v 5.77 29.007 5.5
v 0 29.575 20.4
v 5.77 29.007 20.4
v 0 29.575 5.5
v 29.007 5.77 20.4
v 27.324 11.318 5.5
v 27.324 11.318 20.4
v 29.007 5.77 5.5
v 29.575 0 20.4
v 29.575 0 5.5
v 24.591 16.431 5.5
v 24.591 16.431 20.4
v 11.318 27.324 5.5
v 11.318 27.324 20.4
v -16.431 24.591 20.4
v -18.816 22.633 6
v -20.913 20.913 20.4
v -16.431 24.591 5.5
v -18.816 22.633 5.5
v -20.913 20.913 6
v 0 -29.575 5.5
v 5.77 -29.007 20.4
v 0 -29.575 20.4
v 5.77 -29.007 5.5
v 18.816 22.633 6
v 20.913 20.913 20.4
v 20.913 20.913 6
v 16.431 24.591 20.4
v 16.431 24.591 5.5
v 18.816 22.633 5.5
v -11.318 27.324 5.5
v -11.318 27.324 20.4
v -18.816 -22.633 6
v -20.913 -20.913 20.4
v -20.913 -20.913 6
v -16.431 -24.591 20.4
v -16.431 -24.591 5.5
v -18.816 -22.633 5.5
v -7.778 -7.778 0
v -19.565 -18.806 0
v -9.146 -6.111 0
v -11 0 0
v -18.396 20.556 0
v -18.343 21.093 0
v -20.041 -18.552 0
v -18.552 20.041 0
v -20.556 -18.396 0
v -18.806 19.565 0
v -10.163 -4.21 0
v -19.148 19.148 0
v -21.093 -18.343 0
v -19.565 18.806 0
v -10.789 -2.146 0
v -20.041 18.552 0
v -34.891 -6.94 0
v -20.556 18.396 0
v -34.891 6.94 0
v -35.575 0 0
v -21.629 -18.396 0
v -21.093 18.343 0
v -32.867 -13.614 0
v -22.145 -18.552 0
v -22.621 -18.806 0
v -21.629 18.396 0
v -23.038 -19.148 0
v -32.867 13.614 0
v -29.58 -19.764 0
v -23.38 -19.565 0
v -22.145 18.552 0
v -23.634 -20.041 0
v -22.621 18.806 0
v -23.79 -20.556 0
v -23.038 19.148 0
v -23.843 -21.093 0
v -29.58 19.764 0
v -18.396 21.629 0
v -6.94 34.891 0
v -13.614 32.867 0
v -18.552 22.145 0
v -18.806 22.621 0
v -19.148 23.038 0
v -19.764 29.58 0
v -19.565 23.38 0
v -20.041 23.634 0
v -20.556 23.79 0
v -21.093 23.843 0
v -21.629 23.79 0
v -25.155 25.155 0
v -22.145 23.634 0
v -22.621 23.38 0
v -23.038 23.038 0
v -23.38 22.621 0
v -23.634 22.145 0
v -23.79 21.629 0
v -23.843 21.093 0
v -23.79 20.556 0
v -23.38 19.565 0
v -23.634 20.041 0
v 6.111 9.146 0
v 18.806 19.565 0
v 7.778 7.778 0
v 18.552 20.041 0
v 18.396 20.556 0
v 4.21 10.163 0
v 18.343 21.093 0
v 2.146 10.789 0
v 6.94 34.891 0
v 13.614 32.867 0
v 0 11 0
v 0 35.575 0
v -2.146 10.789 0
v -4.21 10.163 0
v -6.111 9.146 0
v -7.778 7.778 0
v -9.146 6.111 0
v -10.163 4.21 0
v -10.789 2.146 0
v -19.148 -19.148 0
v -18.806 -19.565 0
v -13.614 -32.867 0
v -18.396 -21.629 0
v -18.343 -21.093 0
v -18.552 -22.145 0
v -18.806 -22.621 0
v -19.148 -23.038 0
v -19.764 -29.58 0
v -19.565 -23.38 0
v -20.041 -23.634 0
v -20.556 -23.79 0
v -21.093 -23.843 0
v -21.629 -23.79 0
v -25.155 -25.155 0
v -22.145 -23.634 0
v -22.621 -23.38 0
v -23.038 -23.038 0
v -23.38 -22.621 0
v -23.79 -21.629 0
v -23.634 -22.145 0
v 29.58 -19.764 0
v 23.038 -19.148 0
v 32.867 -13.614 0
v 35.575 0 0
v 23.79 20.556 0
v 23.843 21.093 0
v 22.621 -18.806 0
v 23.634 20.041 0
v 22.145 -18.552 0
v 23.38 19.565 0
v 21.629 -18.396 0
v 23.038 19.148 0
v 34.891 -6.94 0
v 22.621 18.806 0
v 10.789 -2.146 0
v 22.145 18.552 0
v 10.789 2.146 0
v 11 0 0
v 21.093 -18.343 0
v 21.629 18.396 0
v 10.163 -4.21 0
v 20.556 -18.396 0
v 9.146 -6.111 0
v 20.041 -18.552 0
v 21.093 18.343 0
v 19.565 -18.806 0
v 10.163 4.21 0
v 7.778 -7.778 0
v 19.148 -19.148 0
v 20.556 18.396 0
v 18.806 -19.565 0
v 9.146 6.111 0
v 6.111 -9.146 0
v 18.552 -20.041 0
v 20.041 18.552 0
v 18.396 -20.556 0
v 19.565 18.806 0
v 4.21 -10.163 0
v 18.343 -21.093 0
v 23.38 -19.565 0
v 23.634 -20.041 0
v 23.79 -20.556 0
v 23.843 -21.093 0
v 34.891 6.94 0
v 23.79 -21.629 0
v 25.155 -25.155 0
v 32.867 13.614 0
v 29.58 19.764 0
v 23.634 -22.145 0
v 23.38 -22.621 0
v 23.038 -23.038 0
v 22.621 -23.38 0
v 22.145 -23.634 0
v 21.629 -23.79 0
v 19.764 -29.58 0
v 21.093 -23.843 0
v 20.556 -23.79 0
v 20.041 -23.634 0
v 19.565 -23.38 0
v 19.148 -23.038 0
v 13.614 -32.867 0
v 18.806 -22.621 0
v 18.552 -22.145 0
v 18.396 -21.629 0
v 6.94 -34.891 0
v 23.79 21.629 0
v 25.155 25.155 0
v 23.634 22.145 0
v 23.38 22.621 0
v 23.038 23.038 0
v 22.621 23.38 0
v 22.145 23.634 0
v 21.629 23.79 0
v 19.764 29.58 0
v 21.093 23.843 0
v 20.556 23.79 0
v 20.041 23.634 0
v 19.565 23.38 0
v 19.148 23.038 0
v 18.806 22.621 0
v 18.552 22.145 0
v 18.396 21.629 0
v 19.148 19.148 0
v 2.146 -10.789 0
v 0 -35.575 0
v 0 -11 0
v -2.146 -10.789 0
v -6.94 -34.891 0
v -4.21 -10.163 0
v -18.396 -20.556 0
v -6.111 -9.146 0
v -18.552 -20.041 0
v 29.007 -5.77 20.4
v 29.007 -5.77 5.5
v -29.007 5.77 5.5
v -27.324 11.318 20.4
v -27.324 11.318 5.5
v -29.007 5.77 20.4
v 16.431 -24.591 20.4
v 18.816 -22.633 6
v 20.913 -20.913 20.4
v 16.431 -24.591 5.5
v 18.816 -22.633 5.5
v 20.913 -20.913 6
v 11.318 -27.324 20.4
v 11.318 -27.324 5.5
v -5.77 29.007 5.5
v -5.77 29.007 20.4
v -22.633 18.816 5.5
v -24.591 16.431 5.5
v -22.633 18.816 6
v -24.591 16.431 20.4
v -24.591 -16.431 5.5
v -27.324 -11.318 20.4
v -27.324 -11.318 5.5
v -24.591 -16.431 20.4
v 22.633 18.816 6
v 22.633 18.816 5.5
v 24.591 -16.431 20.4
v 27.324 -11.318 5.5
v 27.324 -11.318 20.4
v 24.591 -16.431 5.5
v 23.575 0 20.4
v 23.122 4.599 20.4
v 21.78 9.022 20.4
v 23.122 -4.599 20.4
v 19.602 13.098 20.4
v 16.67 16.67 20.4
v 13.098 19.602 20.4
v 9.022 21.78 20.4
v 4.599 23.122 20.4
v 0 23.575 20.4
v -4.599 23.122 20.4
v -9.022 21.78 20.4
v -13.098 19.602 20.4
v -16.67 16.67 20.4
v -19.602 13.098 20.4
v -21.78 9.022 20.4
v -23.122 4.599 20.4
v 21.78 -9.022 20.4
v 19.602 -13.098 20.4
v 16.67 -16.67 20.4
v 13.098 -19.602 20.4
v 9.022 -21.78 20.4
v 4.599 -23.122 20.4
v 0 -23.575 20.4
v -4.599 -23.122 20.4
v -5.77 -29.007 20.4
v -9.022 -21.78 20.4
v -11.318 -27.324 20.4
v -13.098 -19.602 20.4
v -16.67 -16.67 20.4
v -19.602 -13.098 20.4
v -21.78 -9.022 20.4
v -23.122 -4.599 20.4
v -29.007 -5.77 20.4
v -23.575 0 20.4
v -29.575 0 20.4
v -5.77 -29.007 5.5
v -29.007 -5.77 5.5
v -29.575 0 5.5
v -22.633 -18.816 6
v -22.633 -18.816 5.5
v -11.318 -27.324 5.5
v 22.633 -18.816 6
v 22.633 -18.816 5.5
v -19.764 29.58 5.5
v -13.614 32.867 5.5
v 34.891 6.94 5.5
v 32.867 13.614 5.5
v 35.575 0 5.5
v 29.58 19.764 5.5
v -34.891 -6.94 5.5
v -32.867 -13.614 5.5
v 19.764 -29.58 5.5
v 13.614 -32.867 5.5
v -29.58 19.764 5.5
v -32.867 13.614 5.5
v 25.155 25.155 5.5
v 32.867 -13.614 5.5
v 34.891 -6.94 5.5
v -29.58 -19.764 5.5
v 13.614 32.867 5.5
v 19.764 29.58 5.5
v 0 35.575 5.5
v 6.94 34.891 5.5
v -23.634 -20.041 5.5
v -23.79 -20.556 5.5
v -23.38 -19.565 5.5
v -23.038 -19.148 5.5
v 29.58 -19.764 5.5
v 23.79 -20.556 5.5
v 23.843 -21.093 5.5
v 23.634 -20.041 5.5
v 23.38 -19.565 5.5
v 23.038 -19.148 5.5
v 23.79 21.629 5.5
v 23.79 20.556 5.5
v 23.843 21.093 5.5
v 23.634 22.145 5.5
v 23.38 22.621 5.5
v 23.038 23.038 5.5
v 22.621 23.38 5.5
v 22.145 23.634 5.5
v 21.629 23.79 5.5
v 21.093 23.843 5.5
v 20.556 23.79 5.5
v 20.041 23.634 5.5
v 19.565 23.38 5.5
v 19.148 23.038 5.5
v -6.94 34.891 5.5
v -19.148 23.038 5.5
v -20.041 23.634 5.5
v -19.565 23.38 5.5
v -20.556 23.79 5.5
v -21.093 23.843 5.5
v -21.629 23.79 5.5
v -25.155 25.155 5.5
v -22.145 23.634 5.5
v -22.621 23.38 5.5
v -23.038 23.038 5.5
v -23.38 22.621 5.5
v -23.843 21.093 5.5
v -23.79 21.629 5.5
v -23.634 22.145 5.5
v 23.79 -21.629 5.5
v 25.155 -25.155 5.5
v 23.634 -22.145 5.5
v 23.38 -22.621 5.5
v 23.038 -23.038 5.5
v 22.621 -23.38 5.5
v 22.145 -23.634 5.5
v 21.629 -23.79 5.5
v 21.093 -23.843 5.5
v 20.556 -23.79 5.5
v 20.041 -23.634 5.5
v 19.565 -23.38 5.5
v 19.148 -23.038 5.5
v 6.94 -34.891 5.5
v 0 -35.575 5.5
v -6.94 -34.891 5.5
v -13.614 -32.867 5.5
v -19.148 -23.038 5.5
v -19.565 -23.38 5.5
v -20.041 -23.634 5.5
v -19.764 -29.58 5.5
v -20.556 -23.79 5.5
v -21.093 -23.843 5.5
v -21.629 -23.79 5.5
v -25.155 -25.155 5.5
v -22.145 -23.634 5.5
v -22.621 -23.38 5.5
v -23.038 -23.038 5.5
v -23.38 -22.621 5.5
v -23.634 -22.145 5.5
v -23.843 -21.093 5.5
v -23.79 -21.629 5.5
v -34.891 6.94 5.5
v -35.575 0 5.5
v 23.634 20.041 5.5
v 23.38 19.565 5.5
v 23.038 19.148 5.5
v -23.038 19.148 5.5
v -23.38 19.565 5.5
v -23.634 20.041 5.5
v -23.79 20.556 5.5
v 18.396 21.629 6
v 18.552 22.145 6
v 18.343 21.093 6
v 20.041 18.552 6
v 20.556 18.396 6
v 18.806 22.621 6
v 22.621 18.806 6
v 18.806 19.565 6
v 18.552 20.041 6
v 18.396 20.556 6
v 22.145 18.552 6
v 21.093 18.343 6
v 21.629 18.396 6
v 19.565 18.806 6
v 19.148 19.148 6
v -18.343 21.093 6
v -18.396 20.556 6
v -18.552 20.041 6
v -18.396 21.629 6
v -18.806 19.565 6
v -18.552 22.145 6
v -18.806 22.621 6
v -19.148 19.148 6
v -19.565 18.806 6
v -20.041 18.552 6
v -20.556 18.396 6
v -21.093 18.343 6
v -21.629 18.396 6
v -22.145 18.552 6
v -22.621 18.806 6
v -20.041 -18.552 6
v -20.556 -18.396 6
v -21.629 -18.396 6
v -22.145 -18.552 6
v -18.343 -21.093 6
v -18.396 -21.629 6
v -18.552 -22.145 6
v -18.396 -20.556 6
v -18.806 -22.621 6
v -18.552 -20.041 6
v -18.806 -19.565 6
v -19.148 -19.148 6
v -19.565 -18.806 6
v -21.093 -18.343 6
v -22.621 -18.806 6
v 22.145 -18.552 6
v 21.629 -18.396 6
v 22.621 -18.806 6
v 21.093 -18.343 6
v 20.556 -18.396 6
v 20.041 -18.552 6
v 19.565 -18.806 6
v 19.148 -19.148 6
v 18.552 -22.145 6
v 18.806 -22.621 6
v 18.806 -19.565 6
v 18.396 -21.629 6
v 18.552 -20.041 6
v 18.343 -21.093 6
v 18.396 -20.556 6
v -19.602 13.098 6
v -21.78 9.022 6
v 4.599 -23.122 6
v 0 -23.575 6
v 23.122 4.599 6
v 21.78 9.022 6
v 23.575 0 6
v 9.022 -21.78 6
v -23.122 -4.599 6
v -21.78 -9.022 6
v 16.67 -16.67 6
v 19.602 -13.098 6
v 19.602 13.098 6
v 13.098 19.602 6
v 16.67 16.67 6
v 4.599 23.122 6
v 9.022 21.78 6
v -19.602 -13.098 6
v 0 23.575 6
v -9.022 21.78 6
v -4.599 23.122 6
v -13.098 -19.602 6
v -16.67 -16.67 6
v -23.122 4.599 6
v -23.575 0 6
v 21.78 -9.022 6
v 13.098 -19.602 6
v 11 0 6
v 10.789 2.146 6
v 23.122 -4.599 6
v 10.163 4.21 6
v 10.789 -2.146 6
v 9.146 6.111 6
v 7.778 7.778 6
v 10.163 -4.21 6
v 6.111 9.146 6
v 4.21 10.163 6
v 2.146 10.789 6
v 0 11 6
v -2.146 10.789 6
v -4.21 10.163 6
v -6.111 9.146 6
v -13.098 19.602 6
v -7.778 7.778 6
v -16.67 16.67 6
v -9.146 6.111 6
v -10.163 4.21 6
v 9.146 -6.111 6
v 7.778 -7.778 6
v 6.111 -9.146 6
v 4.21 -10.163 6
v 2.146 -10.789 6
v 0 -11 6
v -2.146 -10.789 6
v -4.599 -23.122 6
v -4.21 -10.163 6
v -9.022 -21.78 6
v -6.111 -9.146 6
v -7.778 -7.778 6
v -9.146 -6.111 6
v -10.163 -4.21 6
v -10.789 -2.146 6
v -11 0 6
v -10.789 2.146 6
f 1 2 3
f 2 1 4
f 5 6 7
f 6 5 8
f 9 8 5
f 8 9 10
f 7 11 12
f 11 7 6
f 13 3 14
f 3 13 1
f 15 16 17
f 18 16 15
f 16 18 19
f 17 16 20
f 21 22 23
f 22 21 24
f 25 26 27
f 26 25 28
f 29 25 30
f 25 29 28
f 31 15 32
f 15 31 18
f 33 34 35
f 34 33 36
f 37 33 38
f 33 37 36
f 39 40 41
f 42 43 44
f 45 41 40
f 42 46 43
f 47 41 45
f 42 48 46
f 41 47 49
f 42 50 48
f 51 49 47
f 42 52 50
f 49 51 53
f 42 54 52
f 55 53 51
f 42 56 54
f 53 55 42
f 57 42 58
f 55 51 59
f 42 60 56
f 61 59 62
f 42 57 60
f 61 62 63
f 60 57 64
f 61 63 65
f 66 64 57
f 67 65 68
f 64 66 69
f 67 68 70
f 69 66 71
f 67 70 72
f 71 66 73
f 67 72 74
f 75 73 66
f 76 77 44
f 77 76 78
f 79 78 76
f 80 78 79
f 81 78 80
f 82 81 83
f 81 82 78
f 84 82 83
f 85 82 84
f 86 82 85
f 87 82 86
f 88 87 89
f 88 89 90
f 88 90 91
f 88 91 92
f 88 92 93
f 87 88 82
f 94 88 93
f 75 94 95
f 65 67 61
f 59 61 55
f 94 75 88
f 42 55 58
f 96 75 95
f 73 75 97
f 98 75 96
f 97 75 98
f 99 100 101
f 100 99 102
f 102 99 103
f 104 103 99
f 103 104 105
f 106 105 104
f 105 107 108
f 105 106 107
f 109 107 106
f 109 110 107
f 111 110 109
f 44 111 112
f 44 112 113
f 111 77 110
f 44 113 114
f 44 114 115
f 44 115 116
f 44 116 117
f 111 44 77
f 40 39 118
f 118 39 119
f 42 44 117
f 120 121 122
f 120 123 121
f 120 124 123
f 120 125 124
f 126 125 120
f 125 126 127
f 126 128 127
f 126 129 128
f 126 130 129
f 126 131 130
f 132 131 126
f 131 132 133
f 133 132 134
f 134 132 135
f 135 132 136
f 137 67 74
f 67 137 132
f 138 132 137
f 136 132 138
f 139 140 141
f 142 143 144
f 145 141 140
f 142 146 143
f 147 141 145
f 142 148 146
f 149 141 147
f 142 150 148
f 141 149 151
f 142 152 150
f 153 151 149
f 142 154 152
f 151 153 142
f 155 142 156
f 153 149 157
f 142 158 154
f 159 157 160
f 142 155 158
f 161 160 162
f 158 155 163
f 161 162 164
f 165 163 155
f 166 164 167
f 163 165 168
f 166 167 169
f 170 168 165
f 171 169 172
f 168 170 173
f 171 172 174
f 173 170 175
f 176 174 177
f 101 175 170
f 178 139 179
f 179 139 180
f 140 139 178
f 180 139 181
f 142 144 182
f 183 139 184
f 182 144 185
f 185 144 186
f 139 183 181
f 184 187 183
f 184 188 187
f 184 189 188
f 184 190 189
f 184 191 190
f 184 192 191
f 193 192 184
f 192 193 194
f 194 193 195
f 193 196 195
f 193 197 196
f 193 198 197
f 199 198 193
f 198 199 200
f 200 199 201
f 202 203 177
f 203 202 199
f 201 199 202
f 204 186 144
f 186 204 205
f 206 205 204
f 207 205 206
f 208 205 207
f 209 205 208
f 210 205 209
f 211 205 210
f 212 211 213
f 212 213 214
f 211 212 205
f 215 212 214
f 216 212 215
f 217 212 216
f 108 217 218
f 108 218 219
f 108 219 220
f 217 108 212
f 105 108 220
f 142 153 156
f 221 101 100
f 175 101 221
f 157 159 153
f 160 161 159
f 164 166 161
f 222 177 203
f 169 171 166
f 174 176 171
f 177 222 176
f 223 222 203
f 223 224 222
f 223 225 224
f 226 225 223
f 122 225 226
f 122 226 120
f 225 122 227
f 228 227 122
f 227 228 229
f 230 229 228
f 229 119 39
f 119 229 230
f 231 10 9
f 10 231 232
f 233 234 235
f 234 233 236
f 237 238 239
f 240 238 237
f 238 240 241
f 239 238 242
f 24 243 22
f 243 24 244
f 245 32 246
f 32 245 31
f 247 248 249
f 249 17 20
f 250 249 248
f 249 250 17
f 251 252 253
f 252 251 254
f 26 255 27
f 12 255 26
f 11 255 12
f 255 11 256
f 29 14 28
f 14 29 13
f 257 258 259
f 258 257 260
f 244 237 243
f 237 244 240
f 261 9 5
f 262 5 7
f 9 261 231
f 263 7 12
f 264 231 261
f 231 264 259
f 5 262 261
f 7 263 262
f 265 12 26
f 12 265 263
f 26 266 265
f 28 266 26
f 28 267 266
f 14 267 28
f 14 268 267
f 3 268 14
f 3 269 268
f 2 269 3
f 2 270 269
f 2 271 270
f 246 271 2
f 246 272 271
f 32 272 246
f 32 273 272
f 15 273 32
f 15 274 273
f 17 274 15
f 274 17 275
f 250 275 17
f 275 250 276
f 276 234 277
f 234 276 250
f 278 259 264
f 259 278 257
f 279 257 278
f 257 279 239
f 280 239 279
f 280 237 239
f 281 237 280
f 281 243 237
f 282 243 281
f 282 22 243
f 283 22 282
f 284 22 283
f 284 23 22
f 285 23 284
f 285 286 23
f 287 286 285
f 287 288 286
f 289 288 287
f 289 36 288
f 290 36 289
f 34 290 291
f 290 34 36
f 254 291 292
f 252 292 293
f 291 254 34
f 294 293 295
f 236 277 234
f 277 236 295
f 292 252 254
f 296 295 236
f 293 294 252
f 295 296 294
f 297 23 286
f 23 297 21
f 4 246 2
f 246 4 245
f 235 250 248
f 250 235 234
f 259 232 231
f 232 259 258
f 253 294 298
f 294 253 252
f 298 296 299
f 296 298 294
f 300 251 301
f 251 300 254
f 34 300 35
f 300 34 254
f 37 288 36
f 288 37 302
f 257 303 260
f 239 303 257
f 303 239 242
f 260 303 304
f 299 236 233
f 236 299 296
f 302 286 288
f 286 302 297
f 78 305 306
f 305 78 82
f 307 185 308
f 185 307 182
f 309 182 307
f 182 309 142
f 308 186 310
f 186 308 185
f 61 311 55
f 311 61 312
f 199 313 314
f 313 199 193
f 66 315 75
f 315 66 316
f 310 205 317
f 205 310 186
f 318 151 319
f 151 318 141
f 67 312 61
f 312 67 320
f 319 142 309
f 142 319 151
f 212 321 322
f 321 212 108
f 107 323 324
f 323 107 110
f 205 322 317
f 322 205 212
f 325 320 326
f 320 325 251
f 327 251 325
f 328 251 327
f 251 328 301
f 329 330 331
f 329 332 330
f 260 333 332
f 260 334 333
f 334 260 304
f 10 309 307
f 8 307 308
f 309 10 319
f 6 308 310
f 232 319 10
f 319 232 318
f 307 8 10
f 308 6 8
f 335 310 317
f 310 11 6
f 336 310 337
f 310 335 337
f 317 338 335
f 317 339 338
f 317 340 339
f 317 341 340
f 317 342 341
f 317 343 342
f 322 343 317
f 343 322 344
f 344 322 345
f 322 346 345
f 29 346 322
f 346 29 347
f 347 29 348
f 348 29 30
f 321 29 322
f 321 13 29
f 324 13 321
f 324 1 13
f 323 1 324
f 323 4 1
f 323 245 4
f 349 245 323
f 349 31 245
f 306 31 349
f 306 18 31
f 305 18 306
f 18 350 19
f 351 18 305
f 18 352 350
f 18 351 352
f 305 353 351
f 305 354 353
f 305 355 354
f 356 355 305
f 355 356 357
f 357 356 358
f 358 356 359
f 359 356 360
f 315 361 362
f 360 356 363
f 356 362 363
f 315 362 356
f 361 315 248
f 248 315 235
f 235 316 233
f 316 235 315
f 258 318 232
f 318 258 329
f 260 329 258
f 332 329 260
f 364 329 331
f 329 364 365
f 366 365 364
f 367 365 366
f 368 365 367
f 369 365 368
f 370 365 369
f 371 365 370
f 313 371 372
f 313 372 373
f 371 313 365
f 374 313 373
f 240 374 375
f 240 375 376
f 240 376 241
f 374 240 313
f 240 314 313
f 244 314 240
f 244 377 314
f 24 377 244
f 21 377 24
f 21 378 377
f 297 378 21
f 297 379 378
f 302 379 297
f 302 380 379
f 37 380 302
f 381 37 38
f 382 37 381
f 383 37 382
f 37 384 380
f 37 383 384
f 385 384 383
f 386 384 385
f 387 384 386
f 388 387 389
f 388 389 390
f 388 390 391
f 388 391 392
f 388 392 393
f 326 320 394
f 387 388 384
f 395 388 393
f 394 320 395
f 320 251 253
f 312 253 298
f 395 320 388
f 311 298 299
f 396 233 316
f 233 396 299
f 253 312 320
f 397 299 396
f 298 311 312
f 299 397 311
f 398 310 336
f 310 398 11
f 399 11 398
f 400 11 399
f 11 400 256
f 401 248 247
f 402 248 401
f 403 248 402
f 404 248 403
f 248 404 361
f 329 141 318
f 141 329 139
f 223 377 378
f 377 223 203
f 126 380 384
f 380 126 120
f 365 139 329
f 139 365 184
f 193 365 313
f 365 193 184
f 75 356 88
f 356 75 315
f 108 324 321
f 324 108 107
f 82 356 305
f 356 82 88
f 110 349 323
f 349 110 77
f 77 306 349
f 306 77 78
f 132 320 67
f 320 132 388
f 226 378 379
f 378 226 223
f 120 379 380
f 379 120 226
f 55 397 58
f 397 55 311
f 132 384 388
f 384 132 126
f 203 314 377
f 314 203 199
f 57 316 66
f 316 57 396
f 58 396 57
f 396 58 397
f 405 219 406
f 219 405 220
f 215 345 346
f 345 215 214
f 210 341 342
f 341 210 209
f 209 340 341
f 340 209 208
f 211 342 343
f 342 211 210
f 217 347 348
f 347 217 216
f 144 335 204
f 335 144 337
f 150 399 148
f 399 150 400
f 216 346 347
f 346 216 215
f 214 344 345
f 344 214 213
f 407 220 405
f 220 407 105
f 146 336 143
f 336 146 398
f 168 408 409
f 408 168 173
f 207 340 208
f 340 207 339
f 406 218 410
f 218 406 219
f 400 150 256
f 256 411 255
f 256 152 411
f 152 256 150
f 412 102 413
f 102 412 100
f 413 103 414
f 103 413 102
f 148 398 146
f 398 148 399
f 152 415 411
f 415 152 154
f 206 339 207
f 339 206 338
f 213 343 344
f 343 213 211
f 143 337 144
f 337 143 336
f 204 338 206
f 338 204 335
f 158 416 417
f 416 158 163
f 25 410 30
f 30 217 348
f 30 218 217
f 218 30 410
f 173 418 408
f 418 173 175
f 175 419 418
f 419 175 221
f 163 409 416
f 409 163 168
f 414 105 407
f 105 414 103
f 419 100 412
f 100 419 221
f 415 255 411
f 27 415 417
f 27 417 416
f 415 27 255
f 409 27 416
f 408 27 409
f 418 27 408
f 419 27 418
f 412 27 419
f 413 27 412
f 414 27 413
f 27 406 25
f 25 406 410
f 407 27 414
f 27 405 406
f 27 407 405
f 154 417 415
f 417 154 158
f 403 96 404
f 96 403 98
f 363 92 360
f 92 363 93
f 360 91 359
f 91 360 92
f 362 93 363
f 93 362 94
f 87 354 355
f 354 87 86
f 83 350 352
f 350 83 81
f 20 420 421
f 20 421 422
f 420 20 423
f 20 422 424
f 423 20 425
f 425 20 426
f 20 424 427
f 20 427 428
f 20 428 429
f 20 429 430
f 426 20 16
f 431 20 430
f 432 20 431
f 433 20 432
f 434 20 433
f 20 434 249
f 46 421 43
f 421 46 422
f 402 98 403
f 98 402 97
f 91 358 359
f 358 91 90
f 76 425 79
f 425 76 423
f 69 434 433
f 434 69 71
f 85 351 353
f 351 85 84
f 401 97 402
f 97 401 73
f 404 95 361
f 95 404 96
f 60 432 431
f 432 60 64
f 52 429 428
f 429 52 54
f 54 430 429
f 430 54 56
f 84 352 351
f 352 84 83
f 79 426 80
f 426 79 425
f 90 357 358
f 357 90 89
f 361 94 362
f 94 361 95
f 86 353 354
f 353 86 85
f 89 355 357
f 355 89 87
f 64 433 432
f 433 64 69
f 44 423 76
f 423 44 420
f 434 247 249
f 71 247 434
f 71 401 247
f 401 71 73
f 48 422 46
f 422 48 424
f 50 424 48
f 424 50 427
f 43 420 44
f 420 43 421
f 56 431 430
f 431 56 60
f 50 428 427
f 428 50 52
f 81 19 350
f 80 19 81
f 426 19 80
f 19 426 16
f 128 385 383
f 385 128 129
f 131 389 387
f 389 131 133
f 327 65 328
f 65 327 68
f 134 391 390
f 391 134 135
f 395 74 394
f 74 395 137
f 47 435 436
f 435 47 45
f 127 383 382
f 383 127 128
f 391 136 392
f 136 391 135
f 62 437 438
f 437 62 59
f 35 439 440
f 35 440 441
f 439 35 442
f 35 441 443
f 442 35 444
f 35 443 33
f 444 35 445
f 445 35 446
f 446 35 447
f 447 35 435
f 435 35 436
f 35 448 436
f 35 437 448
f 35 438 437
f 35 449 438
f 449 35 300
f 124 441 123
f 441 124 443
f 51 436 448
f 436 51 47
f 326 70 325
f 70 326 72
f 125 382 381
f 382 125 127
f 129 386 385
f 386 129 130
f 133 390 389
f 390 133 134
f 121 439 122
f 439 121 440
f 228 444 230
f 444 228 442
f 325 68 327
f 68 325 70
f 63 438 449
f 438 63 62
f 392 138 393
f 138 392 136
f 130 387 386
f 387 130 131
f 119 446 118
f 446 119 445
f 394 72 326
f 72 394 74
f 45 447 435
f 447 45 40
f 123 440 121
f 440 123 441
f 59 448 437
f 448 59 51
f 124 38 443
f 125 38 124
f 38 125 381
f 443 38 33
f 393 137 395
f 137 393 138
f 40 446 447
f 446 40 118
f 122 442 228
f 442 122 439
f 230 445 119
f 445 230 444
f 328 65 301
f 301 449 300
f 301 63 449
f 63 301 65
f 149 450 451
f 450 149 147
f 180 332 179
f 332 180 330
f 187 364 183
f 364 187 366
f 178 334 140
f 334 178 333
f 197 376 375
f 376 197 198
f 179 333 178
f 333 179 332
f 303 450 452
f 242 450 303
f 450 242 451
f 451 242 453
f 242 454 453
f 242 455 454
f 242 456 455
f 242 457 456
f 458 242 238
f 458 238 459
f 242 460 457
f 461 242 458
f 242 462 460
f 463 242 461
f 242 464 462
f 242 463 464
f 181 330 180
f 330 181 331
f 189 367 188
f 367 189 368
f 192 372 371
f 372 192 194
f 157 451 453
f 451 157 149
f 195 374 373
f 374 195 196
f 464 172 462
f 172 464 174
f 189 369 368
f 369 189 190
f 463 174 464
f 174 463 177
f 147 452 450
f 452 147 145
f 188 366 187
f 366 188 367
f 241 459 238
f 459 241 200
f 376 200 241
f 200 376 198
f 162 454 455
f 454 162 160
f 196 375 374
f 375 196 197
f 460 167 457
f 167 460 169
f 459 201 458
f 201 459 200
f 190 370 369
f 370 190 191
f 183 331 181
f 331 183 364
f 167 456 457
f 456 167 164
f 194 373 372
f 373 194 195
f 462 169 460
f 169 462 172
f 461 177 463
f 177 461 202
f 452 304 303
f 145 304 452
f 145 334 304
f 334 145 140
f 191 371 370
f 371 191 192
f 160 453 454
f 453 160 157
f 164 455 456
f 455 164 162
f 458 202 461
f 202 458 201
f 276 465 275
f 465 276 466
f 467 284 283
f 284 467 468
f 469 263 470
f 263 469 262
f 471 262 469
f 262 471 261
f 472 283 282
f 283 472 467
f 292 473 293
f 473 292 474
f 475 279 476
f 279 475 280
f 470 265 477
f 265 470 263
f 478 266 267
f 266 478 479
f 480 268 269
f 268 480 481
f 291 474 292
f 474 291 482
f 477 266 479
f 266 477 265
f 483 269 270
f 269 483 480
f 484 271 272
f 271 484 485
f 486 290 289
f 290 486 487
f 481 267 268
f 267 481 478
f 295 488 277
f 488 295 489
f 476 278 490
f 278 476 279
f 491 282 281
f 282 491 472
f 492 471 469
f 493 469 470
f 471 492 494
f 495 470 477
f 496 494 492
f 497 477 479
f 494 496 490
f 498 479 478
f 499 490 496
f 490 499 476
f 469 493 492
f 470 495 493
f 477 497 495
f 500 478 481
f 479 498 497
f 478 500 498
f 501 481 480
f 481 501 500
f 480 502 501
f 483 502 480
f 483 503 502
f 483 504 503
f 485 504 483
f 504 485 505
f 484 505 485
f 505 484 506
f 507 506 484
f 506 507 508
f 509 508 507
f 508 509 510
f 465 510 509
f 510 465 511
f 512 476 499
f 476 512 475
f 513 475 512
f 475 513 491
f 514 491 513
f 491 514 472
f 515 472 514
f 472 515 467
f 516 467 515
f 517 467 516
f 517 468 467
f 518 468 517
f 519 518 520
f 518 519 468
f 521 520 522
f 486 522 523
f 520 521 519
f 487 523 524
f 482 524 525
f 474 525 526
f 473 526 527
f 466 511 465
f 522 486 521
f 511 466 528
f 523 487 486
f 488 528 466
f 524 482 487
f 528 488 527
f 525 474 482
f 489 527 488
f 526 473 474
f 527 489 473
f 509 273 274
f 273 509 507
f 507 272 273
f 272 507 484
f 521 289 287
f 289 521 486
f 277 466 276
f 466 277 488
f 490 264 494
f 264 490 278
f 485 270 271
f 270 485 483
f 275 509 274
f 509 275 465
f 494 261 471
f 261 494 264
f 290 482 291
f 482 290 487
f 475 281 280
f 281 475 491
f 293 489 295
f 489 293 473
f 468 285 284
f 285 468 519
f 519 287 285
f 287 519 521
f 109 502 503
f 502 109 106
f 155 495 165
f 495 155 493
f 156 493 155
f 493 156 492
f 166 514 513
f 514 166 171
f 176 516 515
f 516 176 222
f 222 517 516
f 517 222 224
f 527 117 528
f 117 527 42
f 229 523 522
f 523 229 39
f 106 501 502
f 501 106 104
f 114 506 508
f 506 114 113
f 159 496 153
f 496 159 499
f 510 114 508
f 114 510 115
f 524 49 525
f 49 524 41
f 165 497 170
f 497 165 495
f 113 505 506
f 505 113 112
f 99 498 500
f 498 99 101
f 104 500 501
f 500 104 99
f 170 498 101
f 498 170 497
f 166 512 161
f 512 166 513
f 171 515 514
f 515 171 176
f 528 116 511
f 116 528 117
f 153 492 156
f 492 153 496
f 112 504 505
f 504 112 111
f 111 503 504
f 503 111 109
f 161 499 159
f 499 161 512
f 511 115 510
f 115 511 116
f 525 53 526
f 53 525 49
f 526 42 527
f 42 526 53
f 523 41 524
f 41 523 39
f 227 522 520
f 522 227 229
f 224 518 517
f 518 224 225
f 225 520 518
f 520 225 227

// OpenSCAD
$fn = 32;

// ----------------------------------------------------------------------
// Bearing housing: seat for 6204 (47 x 14 mm), 59.15 mm body
// ----------------------------------------------------------------------

// --- parameters (mm) ---
case_d = 59.15;           // housing outside diameter
case_h = 20.4;            // overall housing height
rim_t = 6;                // wall thickness
bearing_seat = 47.15;     // 6204 seat, 0.15 mm clearance
seat_h = 14.4;            // pocket depth
shoulder = 2;             // shoulder under the bearing
pass_d = 22;              // shaft passage
ear_d = 71.15;            // mounting flange diameter
flange_t = 4;             // flange thickness
bolt_d = 5.5;             // flange bolt clearance
bolt_r = 29.83;           // flange bolt circle radius

module body() {
  cylinder(h = case_h, d = case_d);
}

module flange() {
  /* flange sunk 1.5 mm into the body */
  cylinder(h = flange_t + 1.5, d = ear_d);
}

difference() {
  union() {
    body();
    flange();
  }
  translate([0, 0, case_h - seat_h]) cylinder(h = seat_h + 1, d = bearing_seat);
  translate([0, 0, -1]) cylinder(h = case_h - seat_h + 1, d = pass_d);
  for (i = [0 : 3]) rotate([0, 0, 45 + i * 90]) translate([bolt_r, 0, -1])
    cylinder(h = flange_t + 3, d = bolt_d);
}
